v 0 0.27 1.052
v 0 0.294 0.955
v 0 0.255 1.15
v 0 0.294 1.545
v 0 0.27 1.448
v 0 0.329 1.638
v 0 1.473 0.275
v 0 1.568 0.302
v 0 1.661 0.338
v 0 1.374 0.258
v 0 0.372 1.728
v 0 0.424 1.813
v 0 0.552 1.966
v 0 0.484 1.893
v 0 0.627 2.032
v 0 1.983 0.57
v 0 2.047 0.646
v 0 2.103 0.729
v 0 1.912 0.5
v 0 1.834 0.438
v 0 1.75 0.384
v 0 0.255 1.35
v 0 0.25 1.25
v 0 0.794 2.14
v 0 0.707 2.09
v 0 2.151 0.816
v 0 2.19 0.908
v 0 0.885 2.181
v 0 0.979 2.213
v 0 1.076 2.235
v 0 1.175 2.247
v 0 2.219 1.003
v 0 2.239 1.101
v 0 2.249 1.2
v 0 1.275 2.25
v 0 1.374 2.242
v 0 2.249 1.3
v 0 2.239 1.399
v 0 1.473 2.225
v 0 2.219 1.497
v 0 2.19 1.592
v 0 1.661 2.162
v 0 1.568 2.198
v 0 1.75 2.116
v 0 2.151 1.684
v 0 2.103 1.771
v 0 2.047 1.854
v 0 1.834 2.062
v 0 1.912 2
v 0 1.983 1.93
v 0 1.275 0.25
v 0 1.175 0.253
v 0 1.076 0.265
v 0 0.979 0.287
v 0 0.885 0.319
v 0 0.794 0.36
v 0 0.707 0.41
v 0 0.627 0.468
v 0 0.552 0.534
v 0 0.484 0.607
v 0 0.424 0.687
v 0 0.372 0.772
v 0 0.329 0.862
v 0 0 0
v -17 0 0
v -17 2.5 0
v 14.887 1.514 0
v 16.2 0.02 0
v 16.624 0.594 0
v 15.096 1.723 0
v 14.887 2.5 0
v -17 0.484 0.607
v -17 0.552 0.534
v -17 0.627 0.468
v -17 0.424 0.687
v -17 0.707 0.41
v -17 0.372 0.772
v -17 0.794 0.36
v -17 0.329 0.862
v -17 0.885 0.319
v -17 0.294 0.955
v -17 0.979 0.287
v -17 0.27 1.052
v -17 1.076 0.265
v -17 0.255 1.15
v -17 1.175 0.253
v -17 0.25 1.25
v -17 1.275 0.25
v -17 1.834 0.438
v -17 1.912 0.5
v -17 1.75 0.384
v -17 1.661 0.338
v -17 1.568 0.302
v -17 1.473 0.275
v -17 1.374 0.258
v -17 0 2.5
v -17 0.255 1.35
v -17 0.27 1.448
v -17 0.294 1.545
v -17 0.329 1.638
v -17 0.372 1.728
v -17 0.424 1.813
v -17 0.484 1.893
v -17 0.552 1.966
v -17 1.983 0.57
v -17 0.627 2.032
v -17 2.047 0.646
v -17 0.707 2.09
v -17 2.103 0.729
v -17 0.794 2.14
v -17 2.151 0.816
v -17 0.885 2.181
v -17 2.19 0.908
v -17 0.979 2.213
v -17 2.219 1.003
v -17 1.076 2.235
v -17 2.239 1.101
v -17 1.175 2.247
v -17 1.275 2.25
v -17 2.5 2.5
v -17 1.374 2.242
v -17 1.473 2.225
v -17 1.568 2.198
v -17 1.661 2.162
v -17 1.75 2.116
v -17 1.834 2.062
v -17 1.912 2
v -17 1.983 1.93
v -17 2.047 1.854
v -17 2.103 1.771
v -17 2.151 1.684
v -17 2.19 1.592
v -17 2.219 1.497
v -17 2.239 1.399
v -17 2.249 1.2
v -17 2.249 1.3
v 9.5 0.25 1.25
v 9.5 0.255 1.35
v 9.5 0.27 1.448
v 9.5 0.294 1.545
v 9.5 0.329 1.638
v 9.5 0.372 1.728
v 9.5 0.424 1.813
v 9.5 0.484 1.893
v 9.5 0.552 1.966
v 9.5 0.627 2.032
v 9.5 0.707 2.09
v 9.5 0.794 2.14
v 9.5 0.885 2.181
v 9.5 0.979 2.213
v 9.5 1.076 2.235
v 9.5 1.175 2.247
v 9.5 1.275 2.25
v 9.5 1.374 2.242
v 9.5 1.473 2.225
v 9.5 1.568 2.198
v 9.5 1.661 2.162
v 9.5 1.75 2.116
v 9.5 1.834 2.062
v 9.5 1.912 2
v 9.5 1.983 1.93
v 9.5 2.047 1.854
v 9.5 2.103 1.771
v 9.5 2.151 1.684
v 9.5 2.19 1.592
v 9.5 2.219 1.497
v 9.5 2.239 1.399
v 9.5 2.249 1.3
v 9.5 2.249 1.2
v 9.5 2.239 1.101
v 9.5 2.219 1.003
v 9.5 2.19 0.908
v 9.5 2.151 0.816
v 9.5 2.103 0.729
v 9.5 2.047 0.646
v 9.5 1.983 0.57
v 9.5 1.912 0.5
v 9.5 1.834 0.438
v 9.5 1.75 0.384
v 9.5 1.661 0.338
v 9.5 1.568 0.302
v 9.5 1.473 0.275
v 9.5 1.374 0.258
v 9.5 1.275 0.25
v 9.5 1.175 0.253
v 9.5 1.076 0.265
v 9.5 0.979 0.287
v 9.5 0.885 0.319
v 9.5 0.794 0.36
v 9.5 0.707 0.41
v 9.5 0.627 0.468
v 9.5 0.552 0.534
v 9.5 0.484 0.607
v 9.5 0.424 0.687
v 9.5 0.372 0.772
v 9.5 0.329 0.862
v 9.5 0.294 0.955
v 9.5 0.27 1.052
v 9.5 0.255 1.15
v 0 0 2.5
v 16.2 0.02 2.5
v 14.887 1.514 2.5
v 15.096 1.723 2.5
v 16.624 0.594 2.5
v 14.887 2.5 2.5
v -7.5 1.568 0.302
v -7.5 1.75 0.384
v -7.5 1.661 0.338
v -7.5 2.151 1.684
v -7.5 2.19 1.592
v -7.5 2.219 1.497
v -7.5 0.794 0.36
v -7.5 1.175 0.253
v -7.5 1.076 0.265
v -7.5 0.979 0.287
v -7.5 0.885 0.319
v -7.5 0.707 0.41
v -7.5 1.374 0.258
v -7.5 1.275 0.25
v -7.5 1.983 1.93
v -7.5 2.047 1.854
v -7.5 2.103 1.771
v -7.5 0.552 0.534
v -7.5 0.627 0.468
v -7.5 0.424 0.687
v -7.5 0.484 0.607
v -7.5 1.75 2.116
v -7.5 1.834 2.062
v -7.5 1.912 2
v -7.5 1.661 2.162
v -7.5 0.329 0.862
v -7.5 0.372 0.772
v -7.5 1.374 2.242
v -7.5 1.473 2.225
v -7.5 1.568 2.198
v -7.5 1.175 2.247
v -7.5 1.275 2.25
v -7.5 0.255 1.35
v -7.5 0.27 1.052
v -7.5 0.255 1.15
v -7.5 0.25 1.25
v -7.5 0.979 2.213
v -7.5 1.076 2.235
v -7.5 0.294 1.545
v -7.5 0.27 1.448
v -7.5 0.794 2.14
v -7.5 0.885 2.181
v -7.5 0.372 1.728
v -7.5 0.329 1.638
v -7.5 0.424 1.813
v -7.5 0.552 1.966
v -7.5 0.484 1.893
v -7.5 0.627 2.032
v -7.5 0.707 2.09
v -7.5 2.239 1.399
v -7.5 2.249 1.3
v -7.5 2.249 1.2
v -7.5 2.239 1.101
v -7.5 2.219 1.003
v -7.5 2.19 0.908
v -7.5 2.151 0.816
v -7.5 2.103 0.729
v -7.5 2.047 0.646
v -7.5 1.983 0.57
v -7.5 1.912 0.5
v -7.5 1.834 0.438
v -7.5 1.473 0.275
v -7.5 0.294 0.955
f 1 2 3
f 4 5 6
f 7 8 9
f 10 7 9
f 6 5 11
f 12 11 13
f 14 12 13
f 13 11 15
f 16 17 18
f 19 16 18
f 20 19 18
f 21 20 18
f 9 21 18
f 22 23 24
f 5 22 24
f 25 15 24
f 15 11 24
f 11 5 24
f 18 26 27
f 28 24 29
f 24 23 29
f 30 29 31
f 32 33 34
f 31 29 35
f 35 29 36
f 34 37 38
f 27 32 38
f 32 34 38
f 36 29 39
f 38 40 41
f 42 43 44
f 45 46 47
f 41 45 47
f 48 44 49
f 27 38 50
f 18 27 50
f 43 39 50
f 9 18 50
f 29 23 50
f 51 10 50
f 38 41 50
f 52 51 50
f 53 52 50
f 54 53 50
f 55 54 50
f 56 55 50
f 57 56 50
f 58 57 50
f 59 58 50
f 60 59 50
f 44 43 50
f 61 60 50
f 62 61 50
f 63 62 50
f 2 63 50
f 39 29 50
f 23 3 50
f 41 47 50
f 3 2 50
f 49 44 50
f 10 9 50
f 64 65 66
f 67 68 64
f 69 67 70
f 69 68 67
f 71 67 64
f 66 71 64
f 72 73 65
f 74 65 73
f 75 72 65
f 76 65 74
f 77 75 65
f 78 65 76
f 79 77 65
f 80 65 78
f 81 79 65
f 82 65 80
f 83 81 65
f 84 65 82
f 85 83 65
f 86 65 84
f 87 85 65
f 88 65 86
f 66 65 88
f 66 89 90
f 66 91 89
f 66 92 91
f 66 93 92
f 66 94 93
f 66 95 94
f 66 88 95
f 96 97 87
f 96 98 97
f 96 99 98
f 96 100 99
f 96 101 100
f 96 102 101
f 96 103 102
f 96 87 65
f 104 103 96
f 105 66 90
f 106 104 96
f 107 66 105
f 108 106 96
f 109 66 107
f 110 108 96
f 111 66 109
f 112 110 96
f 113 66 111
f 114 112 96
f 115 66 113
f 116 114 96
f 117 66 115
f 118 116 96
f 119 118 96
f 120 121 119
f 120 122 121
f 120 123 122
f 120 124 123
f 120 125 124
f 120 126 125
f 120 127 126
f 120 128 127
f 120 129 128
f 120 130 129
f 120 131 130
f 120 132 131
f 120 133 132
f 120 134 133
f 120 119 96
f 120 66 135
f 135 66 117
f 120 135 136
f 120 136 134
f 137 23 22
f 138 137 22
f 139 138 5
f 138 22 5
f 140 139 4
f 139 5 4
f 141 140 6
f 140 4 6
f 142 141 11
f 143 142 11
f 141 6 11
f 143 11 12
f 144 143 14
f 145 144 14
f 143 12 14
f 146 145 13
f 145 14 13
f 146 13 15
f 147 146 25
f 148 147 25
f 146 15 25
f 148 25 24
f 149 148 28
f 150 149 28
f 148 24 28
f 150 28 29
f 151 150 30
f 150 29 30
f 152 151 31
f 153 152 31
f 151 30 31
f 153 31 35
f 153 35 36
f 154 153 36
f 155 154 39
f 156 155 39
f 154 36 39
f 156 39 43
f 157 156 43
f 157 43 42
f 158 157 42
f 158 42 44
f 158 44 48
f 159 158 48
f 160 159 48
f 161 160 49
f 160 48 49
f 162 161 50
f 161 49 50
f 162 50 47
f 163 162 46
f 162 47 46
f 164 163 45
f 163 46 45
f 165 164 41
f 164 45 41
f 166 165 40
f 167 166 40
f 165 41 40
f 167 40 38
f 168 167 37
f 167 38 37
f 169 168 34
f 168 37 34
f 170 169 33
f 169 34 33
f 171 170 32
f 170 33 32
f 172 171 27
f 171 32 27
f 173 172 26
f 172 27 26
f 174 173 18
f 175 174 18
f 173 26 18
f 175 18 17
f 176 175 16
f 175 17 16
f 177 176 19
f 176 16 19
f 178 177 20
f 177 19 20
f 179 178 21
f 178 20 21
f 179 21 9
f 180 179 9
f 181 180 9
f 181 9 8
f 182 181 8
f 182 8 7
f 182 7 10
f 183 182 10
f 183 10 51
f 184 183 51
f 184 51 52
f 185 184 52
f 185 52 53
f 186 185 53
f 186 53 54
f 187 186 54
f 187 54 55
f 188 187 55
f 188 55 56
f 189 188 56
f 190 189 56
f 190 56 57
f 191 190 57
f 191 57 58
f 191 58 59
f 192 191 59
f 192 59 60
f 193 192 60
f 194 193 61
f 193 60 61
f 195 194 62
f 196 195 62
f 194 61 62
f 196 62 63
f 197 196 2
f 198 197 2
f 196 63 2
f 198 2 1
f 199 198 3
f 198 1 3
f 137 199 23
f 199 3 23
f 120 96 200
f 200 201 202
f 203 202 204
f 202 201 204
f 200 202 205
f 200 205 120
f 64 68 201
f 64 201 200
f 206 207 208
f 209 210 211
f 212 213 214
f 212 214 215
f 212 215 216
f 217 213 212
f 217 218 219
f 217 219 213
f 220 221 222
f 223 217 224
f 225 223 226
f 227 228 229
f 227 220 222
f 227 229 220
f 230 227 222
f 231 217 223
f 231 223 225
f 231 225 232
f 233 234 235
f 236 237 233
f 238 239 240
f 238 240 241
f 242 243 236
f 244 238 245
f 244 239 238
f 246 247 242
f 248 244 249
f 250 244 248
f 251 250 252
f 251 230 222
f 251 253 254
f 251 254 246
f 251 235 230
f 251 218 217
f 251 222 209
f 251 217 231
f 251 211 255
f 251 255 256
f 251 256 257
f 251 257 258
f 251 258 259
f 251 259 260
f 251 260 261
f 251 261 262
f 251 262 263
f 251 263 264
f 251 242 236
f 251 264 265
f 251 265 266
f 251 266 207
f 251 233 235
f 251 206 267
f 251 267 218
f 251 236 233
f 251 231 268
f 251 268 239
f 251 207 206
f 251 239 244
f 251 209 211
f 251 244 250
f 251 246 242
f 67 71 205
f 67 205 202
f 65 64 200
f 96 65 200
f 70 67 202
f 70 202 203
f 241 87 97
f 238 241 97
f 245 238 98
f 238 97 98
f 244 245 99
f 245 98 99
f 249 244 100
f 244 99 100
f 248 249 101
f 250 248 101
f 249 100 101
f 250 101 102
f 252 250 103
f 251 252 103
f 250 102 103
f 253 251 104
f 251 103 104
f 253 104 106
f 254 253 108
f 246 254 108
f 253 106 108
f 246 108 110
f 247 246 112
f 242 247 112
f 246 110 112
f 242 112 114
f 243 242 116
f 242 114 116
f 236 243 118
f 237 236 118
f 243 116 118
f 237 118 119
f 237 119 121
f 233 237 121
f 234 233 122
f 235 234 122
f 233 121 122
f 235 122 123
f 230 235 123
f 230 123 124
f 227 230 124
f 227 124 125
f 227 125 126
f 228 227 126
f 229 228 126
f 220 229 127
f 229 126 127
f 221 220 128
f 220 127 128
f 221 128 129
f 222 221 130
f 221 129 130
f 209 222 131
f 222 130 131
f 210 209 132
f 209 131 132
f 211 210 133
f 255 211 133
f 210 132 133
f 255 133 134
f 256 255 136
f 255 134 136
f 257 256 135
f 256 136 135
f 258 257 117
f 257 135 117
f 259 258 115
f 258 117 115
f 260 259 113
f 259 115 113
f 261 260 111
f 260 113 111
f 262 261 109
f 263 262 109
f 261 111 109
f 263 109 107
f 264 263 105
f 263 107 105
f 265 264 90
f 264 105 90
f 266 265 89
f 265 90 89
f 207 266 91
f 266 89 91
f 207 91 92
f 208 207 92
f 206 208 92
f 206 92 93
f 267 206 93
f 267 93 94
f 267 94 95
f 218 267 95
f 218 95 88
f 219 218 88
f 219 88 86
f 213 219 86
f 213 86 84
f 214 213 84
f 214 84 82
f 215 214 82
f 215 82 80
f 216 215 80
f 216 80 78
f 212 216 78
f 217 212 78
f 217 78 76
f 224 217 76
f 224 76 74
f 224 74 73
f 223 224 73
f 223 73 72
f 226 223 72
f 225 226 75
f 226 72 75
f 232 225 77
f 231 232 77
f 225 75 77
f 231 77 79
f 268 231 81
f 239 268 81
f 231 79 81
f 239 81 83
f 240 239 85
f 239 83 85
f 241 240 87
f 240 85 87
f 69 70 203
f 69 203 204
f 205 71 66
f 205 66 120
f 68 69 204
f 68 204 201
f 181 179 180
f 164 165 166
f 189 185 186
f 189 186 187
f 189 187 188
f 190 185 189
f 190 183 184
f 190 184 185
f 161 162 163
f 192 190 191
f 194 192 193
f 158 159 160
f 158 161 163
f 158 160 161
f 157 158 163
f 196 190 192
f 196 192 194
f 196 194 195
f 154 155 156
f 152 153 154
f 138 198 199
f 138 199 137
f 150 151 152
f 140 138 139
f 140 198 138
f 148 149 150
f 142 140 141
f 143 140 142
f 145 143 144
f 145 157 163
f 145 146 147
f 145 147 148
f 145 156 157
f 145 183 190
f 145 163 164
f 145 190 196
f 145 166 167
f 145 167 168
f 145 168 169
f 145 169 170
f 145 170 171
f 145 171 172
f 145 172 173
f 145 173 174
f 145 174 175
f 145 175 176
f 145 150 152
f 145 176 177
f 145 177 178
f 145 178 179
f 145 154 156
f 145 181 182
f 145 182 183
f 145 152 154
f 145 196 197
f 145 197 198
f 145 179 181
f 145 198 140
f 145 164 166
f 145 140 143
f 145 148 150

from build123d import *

# Parameters (mm, degrees)
BOSS_EXTRUDE1_DEPTH = 2.5
SKETCH3_R           = 1
CUT_EXTRUDE1_DEPTH  = 9.5
SKETCH4_W           = 2.5
SKETCH4_H           = 2.5
BOSS_EXTRUDE3_DEPTH = 17
SKETCH5_R           = 1
CUT_EXTRUDE2_DEPTH  = 9.5


with BuildPart() as part:
    # Sketch1 → Boss-Extrude1 (new body)
    with BuildSketch(Plane.XY):
        Polygon((0, 0), (0, 1.5), (0, 2.5), (14.886845494, 2.5), (14.886845494, 1.514116192), (15.095983031, 1.72325373), (16.624293577, 0.594484955), (16.2, 0.02000738), align=None)
    extrude(amount=BOSS_EXTRUDE1_DEPTH)

    # Sketch3 → Cut-Extrude1 (cut)
    with BuildSketch(Plane.ZY):
        with Locations(Location((1.25, 1.25, 0), (0, 0, 270))):
            Circle(SKETCH3_R)
    extrude(amount=-CUT_EXTRUDE1_DEPTH, mode=Mode.SUBTRACT)

    # Sketch4 → Boss-Extrude3 (add)
    with BuildSketch(Plane.ZY):
        with Locations((1.25, 1.25)):
            Rectangle(SKETCH4_W, SKETCH4_H)
    extrude(amount=BOSS_EXTRUDE3_DEPTH)

    # Sketch5 → Cut-Extrude2 (cut)
    with BuildSketch(Plane.ZY.offset(17)):
        with Locations(Location((1.25, 1.25, 0), (0, 0, 270))):
            Circle(SKETCH5_R)
    extrude(amount=-CUT_EXTRUDE2_DEPTH, mode=Mode.SUBTRACT)


solid = part.part
